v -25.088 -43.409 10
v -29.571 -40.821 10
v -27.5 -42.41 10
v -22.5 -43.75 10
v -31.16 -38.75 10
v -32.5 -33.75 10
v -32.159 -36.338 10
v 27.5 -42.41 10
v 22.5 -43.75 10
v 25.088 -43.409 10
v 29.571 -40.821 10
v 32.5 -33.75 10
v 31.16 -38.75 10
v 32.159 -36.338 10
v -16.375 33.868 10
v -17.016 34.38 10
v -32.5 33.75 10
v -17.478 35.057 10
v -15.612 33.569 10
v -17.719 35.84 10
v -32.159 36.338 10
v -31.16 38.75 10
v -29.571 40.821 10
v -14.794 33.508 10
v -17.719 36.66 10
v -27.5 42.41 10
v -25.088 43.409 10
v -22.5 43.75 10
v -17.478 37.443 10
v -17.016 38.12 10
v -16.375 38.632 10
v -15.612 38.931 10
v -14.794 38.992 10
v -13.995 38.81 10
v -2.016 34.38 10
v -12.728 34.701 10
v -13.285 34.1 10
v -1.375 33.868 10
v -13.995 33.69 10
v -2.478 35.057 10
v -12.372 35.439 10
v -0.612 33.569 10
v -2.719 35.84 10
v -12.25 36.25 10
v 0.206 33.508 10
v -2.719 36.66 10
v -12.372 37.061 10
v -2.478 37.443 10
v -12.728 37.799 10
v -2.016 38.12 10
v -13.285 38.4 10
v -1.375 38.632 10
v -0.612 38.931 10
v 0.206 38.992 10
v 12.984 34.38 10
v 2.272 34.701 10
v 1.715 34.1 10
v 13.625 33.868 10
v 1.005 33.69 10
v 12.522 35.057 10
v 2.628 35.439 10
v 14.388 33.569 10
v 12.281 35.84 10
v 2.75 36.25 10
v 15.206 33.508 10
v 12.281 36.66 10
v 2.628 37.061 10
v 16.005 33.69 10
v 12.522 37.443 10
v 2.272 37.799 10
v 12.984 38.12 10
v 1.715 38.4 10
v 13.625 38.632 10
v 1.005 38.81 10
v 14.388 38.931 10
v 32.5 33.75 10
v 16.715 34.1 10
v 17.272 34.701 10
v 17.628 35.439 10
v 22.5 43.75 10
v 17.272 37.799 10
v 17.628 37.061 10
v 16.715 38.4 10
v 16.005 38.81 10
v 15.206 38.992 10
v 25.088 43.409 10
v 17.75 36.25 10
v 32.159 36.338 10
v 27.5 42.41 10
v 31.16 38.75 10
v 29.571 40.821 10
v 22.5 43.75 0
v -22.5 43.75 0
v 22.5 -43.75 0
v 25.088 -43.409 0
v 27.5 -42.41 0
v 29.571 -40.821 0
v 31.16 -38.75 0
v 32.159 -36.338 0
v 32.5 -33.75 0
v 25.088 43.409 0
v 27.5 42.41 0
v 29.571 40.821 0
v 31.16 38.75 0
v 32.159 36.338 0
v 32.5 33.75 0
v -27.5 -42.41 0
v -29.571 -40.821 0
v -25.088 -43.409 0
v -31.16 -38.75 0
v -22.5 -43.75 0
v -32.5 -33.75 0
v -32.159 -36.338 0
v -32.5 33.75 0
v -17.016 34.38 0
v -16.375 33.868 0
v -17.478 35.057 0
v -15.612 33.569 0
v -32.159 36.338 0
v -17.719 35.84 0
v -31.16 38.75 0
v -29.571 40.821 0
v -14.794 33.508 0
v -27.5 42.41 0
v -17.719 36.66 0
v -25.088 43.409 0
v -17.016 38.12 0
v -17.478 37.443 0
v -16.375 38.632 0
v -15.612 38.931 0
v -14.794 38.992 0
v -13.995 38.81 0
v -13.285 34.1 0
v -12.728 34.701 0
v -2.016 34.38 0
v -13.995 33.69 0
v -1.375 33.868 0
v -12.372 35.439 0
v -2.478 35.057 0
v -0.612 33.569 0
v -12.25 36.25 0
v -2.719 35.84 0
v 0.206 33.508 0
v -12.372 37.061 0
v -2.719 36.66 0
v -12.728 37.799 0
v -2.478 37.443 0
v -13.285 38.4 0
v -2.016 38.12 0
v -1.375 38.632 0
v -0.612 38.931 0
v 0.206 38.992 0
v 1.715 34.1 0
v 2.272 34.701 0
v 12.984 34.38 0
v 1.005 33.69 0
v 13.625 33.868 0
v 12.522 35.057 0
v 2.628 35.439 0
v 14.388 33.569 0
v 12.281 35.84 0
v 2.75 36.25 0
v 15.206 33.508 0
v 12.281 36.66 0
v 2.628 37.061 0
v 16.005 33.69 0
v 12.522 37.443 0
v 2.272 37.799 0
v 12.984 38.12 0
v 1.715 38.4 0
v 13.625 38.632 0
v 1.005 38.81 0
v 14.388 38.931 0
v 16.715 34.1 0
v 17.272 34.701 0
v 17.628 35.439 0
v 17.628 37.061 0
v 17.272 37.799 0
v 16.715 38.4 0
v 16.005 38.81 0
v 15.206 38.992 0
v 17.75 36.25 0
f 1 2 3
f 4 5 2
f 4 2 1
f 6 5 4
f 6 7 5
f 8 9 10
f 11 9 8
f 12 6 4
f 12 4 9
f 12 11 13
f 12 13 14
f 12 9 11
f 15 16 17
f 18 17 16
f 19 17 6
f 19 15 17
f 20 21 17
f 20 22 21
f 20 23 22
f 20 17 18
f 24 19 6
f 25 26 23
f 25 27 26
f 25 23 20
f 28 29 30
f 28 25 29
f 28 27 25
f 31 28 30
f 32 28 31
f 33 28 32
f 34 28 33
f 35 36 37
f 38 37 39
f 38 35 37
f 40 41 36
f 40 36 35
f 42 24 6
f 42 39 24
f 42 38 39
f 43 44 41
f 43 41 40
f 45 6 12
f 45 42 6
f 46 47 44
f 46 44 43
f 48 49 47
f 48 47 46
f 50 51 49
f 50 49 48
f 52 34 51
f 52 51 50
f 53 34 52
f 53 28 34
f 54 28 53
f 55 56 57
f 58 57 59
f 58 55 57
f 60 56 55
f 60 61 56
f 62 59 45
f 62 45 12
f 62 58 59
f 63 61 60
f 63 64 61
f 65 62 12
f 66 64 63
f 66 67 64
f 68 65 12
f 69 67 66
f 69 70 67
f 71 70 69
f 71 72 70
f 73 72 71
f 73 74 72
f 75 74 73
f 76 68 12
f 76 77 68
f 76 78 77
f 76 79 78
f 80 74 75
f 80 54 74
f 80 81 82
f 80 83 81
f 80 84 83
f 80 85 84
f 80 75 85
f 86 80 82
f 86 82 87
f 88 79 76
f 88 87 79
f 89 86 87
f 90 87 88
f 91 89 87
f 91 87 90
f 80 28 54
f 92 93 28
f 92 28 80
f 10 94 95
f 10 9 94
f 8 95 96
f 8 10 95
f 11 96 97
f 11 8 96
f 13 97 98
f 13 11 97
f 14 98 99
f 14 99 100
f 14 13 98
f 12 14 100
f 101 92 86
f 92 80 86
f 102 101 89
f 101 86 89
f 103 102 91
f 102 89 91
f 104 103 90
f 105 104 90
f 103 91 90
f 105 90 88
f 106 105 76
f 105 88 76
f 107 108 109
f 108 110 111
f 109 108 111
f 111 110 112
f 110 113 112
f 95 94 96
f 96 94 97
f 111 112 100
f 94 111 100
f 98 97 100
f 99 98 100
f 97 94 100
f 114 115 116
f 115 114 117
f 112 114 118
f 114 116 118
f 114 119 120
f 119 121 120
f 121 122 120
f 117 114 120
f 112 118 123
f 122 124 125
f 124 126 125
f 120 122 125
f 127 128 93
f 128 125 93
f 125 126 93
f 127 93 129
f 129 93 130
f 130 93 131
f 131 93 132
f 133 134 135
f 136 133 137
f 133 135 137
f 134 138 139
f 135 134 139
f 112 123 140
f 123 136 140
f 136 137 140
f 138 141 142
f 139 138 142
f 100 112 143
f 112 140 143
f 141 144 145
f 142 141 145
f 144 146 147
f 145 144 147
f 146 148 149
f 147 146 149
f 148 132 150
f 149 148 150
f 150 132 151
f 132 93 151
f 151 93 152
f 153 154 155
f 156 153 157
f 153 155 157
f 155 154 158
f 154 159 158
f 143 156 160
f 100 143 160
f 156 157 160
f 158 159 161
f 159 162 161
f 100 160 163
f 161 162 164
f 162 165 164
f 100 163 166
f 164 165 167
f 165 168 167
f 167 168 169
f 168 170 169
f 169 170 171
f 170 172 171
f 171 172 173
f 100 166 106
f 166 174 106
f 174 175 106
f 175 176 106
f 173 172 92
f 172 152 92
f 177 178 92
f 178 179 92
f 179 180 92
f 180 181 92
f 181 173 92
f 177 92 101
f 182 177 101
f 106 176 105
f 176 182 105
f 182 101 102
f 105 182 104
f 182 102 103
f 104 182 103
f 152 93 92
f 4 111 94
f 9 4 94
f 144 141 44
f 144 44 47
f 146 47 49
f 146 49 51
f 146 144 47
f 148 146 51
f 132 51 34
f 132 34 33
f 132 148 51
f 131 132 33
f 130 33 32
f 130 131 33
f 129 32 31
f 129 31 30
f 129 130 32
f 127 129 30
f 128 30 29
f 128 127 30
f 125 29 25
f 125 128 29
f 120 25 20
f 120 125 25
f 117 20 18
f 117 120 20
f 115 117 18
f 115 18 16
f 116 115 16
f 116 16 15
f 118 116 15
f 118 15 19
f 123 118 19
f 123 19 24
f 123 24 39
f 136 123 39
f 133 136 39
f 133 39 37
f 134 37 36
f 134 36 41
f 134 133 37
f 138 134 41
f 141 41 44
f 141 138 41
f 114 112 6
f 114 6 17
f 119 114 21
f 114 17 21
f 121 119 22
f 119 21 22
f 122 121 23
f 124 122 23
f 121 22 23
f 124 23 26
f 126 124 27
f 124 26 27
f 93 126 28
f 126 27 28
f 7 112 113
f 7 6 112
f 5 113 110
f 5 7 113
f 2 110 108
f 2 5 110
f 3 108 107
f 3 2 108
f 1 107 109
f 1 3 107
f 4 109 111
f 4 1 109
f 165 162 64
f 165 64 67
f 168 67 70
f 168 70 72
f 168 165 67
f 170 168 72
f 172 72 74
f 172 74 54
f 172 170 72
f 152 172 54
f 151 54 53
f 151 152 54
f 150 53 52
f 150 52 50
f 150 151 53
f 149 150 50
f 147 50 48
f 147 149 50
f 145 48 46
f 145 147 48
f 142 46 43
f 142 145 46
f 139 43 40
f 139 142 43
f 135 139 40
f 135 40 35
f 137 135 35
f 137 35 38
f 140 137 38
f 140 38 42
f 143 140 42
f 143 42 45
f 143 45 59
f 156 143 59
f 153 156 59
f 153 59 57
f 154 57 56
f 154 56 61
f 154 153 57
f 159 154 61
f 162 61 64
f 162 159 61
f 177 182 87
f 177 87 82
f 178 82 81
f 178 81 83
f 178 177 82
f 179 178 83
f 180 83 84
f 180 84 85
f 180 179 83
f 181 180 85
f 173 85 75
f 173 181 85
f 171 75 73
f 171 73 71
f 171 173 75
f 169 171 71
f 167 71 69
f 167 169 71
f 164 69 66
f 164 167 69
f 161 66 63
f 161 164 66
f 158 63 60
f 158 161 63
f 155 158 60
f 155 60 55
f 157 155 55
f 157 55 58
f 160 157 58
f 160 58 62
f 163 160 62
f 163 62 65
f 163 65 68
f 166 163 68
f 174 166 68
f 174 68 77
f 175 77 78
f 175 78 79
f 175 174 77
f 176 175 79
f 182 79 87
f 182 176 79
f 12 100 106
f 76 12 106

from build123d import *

# Parameters (mm, degrees)
SKETCH1_W           = 65
SKETCH1_H           = 87.5
SKETCH1_R           = 2.75
BOSS_EXTRUDE1_DEPTH = 10
FILLET1_R           = 10


with BuildPart() as part:
    # Sketch1 → Boss-Extrude1 (new body)
    with BuildSketch(Plane.XY):
        Rectangle(SKETCH1_W, SKETCH1_H)
        with Locations((-15, 36.25)):
            Circle(SKETCH1_R, mode=Mode.SUBTRACT)
        with Locations((0, 36.25)):
            Circle(SKETCH1_R, mode=Mode.SUBTRACT)
        with Locations((15, 36.25)):
            Circle(SKETCH1_R, mode=Mode.SUBTRACT)
    extrude(amount=BOSS_EXTRUDE1_DEPTH)

    # Fillet1
    fillet1_edges = [part.edges().sort_by_distance(p)[0] for p in [
        (-32.5, 43.75, 5),
        (32.5, 43.75, 5),
        (32.5, -43.75, 5),
        (-32.5, -43.75, 5),
    ]]
    fillet(fillet1_edges, radius=FILLET1_R)


solid = part.part
